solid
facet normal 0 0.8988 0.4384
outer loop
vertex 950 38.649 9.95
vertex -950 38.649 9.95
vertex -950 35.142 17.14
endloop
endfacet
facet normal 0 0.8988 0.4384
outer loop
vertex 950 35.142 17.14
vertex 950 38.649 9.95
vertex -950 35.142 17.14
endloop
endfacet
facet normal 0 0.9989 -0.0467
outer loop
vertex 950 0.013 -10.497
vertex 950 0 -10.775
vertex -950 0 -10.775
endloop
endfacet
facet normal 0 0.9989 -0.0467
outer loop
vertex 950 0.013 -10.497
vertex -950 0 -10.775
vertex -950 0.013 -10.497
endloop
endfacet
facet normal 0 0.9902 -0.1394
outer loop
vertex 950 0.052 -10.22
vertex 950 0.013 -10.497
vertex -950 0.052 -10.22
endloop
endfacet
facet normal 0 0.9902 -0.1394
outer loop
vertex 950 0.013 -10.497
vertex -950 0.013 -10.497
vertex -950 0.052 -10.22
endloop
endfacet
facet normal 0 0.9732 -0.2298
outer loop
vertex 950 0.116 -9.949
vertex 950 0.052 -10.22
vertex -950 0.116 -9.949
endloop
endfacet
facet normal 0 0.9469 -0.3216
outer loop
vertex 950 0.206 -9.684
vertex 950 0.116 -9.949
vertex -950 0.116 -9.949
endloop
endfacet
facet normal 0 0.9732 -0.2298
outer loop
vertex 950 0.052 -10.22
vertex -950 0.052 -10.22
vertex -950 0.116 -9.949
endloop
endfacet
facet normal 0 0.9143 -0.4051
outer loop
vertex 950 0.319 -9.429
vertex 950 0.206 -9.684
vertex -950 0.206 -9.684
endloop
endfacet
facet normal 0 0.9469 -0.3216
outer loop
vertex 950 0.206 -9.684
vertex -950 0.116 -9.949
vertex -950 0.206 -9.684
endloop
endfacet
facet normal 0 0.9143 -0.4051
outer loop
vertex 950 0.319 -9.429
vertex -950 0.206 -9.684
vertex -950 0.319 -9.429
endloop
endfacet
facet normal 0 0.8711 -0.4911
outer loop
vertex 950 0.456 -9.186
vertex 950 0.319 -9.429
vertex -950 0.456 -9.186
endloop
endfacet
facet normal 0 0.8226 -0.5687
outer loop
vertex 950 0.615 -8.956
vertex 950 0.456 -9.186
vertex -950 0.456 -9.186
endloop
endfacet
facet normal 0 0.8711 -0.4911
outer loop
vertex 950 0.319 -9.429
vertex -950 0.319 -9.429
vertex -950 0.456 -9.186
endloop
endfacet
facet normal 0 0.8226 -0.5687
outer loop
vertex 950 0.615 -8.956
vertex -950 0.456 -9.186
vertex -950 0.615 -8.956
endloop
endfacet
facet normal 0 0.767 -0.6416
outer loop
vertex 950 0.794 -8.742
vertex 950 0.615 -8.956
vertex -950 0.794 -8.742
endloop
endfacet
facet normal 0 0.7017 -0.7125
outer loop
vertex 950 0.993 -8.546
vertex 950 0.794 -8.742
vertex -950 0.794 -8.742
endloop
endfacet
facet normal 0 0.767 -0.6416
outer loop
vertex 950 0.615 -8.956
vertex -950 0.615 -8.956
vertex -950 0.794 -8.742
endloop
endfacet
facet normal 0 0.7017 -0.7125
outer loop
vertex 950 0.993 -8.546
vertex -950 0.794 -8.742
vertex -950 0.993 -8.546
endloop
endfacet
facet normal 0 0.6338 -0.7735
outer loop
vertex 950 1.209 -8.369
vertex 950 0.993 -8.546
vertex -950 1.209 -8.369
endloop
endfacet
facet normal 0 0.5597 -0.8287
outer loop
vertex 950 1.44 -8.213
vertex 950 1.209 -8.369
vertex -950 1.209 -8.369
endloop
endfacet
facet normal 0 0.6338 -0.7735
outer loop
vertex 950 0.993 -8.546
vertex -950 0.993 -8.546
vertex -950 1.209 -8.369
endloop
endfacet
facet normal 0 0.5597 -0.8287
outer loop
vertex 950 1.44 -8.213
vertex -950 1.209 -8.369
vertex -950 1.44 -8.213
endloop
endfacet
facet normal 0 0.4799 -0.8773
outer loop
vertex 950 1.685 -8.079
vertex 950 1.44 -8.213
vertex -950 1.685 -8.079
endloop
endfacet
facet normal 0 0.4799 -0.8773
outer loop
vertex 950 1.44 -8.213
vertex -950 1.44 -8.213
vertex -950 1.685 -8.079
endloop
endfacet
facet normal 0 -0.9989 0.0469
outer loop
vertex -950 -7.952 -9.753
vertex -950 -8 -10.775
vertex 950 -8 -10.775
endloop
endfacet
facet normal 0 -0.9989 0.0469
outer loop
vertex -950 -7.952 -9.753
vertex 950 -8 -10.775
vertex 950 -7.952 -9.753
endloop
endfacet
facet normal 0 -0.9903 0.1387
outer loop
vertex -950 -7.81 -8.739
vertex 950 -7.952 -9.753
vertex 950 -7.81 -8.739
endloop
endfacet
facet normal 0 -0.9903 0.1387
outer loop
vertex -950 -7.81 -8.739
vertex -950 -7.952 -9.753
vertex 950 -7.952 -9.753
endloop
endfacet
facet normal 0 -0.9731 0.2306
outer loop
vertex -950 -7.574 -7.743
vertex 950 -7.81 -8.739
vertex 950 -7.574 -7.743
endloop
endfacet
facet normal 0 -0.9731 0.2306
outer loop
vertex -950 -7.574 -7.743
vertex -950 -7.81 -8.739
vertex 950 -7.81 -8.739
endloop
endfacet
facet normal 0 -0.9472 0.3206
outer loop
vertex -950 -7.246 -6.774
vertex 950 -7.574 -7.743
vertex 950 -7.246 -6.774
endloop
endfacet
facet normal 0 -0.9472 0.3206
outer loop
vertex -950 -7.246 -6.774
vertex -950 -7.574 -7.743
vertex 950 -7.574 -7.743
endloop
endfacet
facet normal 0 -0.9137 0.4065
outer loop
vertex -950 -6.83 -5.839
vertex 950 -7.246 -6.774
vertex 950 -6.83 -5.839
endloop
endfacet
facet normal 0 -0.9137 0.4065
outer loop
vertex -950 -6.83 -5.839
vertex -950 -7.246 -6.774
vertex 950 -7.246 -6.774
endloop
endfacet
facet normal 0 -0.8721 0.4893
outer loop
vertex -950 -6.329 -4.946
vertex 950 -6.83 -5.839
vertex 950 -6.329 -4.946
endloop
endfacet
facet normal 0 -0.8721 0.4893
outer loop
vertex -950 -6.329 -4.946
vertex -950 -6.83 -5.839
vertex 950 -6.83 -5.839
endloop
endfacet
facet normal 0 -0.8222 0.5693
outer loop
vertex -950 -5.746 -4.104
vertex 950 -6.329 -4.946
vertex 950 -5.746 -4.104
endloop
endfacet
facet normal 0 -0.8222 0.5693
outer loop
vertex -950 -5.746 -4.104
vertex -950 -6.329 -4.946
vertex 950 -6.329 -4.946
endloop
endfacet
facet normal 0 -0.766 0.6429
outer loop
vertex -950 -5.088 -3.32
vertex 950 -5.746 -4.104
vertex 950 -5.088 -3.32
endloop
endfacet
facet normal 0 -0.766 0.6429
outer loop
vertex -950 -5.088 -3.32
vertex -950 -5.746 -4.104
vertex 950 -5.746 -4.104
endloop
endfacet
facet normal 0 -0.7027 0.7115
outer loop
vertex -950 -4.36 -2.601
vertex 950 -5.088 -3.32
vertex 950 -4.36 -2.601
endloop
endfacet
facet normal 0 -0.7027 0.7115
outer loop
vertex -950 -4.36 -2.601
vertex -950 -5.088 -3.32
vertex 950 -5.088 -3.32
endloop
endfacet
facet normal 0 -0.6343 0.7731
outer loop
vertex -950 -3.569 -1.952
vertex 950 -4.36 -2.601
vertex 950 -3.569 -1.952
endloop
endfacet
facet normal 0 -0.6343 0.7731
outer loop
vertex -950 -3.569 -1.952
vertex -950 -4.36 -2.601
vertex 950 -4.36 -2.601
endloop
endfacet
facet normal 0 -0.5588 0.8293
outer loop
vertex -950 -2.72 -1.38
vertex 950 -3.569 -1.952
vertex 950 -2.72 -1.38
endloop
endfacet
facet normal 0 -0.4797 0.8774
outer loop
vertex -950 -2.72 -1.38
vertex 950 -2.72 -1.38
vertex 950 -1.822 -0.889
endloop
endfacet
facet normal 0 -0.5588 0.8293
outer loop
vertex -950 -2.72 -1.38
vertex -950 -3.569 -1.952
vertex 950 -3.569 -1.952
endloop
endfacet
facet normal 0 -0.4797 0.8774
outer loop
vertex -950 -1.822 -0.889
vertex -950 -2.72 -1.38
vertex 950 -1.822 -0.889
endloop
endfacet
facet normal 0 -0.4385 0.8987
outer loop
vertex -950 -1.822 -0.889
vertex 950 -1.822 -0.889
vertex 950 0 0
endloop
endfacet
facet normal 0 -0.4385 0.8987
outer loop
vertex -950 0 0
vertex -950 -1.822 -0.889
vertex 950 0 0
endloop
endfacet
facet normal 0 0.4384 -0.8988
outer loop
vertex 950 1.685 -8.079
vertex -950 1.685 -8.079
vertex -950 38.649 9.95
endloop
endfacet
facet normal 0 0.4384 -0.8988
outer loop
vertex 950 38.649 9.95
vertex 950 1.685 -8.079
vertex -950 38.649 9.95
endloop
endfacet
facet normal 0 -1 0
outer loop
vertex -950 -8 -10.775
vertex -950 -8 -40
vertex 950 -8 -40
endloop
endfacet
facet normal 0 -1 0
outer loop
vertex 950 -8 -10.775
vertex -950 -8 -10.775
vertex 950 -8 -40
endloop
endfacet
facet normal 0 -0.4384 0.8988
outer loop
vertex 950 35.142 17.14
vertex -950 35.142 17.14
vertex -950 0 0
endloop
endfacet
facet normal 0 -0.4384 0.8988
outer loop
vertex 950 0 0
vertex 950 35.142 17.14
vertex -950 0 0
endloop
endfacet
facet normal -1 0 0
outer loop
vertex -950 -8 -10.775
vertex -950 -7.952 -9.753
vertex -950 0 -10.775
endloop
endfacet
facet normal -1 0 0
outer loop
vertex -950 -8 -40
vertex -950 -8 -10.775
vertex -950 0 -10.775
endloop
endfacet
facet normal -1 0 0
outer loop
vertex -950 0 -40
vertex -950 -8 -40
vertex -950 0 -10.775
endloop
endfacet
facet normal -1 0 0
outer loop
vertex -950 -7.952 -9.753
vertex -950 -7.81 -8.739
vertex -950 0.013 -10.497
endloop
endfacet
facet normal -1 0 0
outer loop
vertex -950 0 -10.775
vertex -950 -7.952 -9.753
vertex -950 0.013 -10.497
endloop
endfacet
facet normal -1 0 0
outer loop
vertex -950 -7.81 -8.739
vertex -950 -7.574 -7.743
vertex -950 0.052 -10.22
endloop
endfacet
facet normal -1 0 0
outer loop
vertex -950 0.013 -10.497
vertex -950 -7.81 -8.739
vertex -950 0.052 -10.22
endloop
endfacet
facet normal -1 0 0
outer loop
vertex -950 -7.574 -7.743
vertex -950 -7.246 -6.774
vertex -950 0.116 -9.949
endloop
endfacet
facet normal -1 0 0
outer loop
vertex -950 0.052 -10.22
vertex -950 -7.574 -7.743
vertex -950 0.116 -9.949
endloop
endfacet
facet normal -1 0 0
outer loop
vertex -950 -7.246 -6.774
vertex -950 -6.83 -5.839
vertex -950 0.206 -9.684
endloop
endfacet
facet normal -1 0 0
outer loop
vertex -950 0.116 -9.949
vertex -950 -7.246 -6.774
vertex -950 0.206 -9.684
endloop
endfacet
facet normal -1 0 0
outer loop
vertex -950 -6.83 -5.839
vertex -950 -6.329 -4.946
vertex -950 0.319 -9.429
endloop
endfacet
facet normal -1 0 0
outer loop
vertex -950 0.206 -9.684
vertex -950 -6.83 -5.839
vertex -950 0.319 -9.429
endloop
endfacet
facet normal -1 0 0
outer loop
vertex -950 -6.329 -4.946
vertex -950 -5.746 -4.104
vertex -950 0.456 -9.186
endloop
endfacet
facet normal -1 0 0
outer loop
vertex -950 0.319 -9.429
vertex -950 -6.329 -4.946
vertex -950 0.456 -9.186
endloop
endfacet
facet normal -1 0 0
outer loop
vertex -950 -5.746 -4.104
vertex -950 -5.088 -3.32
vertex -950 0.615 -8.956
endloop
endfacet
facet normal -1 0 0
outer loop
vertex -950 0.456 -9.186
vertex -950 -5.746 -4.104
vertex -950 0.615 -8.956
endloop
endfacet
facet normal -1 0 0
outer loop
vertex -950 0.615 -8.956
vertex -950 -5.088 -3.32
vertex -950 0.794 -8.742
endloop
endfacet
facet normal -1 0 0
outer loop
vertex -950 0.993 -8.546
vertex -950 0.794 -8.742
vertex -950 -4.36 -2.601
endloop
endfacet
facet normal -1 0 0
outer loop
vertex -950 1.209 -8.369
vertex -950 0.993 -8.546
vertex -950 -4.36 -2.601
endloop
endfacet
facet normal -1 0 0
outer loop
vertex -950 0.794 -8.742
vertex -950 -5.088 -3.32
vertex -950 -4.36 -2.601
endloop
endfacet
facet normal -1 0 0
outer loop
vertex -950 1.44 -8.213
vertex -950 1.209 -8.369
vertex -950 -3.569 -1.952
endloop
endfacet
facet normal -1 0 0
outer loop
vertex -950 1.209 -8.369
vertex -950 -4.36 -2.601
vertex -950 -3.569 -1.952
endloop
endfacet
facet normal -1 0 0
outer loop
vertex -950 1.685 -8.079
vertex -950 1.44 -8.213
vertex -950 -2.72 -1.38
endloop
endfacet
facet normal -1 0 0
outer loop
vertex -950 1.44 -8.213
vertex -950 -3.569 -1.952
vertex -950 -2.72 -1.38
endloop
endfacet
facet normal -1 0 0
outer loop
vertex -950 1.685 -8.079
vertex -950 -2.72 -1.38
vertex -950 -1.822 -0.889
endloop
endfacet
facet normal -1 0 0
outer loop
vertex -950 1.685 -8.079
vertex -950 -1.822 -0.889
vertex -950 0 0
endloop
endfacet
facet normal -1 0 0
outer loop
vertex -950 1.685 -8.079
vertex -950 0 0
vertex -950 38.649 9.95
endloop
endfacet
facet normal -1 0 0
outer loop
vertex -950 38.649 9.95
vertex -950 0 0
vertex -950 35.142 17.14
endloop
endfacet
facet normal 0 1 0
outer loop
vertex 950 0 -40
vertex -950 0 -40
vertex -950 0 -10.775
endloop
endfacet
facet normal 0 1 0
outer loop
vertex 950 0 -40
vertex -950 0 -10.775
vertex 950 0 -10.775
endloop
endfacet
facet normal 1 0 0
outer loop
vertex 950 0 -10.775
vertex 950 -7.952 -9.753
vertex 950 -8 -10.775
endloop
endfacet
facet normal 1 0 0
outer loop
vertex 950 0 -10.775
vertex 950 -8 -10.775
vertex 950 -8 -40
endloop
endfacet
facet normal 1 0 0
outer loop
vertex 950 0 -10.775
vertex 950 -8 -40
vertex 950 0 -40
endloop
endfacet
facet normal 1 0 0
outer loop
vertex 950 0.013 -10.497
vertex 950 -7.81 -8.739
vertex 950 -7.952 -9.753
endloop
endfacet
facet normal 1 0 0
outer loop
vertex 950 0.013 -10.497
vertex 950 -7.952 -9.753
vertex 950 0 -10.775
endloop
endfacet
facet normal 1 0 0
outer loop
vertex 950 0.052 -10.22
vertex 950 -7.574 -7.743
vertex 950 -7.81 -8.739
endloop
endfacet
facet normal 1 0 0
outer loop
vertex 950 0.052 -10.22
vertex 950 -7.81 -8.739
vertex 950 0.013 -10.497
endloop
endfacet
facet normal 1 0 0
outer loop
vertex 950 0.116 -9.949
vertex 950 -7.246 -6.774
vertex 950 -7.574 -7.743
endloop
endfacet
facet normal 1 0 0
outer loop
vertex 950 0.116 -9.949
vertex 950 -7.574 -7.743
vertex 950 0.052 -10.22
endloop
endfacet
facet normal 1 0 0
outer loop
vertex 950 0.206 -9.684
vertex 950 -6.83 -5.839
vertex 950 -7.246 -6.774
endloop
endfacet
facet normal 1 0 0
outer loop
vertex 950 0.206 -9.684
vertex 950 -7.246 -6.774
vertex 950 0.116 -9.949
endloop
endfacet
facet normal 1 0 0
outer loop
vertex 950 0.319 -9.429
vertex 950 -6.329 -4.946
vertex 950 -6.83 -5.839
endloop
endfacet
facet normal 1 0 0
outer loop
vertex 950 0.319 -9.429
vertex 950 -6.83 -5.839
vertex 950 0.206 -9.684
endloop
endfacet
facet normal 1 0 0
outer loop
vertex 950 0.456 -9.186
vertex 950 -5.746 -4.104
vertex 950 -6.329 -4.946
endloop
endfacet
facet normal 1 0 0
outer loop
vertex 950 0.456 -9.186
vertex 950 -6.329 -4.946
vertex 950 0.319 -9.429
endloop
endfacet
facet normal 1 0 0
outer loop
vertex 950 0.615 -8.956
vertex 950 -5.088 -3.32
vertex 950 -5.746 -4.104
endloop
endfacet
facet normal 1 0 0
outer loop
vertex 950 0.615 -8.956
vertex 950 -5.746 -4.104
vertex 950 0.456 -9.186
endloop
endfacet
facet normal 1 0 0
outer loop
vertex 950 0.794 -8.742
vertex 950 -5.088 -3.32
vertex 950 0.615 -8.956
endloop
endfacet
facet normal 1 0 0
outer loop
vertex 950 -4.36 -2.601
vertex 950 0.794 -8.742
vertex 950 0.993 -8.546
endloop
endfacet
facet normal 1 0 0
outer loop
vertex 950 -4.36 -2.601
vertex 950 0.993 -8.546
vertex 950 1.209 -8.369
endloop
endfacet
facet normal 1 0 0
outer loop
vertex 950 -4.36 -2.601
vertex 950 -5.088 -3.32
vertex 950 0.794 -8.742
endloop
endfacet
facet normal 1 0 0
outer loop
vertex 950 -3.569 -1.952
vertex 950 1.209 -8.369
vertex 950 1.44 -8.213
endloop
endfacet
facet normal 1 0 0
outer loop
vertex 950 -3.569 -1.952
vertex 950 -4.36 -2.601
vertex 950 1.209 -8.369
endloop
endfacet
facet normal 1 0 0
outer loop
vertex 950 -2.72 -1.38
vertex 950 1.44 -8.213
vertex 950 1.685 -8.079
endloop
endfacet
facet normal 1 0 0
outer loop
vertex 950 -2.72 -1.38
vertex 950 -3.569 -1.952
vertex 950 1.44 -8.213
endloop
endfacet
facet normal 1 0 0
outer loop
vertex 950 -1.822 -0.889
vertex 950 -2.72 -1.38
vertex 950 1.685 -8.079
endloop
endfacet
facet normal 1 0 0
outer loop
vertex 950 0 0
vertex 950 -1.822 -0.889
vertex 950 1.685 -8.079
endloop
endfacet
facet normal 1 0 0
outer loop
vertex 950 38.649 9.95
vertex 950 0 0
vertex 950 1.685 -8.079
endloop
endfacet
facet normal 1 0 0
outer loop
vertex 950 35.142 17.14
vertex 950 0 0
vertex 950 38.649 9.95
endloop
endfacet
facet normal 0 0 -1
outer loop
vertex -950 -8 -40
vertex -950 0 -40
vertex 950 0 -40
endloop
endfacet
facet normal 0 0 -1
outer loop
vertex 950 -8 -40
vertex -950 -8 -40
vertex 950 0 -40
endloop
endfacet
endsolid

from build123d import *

# Parameters (mm, degrees)
SKETCH2_W            = 1900
SKETCH2_H            = 40
BASE_FLANGE1_DEPTH   = 8
EDGE_FLANGE1_START   = -950
EDGE_FLANGE1_DEPTH   = 1900
EDGE_FLANGE1_2_DEPTH = 1900


# Read off the part's stored shape, not the designer's step: Edge-Flange1
# Sheet-metal steps are written as plain solids
with BuildPart() as part:
    # Sketch2 → Base-Flange1 (new body)
    with BuildSketch(Plane(origin=(0, 0, 0), x_dir=(1, 0, 0), z_dir=(0, 1, 0))):
        with Locations((0, 20)):
            Rectangle(SKETCH2_W, SKETCH2_H)
    extrude(amount=-BASE_FLANGE1_DEPTH)

    # Edge-Flange1 outline → Edge-Flange1 (cut)
    with BuildSketch(Plane.YZ.offset(EDGE_FLANGE1_START)):
        with BuildLine():
            ThreePointArc((-8, -10.77542358), (-6.328529058, -4.946311673), (-1.822082615, -0.88868907))
            Line((-1.822082615, -0.88868907), (0, 0))
            Line((0, 0), (-8, 0))
            Line((-8, 0), (-8, -10.77542358))
        make_face()
    extrude(amount=EDGE_FLANGE1_DEPTH, mode=Mode.SUBTRACT)

    # Edge-Flange1 2 outline → Edge-Flange1 2 (add)
    with BuildSketch(Plane.YZ.offset(EDGE_FLANGE1_START)):
        with BuildLine():
            Line((35.142114222, 17.139954337), (0, 0))
            Line((0, 0), (0, -10.77542358))
            ThreePointArc((0, -10.77542358), (0.455855712, -9.185665787), (1.68488656, -8.079041441))
            Line((1.68488656, -8.079041441), (38.649083397, 9.949601967))
            Line((38.649083397, 9.949601967), (35.142114222, 17.139954337))
        make_face()
    extrude(amount=EDGE_FLANGE1_2_DEPTH)


solid = part.part
